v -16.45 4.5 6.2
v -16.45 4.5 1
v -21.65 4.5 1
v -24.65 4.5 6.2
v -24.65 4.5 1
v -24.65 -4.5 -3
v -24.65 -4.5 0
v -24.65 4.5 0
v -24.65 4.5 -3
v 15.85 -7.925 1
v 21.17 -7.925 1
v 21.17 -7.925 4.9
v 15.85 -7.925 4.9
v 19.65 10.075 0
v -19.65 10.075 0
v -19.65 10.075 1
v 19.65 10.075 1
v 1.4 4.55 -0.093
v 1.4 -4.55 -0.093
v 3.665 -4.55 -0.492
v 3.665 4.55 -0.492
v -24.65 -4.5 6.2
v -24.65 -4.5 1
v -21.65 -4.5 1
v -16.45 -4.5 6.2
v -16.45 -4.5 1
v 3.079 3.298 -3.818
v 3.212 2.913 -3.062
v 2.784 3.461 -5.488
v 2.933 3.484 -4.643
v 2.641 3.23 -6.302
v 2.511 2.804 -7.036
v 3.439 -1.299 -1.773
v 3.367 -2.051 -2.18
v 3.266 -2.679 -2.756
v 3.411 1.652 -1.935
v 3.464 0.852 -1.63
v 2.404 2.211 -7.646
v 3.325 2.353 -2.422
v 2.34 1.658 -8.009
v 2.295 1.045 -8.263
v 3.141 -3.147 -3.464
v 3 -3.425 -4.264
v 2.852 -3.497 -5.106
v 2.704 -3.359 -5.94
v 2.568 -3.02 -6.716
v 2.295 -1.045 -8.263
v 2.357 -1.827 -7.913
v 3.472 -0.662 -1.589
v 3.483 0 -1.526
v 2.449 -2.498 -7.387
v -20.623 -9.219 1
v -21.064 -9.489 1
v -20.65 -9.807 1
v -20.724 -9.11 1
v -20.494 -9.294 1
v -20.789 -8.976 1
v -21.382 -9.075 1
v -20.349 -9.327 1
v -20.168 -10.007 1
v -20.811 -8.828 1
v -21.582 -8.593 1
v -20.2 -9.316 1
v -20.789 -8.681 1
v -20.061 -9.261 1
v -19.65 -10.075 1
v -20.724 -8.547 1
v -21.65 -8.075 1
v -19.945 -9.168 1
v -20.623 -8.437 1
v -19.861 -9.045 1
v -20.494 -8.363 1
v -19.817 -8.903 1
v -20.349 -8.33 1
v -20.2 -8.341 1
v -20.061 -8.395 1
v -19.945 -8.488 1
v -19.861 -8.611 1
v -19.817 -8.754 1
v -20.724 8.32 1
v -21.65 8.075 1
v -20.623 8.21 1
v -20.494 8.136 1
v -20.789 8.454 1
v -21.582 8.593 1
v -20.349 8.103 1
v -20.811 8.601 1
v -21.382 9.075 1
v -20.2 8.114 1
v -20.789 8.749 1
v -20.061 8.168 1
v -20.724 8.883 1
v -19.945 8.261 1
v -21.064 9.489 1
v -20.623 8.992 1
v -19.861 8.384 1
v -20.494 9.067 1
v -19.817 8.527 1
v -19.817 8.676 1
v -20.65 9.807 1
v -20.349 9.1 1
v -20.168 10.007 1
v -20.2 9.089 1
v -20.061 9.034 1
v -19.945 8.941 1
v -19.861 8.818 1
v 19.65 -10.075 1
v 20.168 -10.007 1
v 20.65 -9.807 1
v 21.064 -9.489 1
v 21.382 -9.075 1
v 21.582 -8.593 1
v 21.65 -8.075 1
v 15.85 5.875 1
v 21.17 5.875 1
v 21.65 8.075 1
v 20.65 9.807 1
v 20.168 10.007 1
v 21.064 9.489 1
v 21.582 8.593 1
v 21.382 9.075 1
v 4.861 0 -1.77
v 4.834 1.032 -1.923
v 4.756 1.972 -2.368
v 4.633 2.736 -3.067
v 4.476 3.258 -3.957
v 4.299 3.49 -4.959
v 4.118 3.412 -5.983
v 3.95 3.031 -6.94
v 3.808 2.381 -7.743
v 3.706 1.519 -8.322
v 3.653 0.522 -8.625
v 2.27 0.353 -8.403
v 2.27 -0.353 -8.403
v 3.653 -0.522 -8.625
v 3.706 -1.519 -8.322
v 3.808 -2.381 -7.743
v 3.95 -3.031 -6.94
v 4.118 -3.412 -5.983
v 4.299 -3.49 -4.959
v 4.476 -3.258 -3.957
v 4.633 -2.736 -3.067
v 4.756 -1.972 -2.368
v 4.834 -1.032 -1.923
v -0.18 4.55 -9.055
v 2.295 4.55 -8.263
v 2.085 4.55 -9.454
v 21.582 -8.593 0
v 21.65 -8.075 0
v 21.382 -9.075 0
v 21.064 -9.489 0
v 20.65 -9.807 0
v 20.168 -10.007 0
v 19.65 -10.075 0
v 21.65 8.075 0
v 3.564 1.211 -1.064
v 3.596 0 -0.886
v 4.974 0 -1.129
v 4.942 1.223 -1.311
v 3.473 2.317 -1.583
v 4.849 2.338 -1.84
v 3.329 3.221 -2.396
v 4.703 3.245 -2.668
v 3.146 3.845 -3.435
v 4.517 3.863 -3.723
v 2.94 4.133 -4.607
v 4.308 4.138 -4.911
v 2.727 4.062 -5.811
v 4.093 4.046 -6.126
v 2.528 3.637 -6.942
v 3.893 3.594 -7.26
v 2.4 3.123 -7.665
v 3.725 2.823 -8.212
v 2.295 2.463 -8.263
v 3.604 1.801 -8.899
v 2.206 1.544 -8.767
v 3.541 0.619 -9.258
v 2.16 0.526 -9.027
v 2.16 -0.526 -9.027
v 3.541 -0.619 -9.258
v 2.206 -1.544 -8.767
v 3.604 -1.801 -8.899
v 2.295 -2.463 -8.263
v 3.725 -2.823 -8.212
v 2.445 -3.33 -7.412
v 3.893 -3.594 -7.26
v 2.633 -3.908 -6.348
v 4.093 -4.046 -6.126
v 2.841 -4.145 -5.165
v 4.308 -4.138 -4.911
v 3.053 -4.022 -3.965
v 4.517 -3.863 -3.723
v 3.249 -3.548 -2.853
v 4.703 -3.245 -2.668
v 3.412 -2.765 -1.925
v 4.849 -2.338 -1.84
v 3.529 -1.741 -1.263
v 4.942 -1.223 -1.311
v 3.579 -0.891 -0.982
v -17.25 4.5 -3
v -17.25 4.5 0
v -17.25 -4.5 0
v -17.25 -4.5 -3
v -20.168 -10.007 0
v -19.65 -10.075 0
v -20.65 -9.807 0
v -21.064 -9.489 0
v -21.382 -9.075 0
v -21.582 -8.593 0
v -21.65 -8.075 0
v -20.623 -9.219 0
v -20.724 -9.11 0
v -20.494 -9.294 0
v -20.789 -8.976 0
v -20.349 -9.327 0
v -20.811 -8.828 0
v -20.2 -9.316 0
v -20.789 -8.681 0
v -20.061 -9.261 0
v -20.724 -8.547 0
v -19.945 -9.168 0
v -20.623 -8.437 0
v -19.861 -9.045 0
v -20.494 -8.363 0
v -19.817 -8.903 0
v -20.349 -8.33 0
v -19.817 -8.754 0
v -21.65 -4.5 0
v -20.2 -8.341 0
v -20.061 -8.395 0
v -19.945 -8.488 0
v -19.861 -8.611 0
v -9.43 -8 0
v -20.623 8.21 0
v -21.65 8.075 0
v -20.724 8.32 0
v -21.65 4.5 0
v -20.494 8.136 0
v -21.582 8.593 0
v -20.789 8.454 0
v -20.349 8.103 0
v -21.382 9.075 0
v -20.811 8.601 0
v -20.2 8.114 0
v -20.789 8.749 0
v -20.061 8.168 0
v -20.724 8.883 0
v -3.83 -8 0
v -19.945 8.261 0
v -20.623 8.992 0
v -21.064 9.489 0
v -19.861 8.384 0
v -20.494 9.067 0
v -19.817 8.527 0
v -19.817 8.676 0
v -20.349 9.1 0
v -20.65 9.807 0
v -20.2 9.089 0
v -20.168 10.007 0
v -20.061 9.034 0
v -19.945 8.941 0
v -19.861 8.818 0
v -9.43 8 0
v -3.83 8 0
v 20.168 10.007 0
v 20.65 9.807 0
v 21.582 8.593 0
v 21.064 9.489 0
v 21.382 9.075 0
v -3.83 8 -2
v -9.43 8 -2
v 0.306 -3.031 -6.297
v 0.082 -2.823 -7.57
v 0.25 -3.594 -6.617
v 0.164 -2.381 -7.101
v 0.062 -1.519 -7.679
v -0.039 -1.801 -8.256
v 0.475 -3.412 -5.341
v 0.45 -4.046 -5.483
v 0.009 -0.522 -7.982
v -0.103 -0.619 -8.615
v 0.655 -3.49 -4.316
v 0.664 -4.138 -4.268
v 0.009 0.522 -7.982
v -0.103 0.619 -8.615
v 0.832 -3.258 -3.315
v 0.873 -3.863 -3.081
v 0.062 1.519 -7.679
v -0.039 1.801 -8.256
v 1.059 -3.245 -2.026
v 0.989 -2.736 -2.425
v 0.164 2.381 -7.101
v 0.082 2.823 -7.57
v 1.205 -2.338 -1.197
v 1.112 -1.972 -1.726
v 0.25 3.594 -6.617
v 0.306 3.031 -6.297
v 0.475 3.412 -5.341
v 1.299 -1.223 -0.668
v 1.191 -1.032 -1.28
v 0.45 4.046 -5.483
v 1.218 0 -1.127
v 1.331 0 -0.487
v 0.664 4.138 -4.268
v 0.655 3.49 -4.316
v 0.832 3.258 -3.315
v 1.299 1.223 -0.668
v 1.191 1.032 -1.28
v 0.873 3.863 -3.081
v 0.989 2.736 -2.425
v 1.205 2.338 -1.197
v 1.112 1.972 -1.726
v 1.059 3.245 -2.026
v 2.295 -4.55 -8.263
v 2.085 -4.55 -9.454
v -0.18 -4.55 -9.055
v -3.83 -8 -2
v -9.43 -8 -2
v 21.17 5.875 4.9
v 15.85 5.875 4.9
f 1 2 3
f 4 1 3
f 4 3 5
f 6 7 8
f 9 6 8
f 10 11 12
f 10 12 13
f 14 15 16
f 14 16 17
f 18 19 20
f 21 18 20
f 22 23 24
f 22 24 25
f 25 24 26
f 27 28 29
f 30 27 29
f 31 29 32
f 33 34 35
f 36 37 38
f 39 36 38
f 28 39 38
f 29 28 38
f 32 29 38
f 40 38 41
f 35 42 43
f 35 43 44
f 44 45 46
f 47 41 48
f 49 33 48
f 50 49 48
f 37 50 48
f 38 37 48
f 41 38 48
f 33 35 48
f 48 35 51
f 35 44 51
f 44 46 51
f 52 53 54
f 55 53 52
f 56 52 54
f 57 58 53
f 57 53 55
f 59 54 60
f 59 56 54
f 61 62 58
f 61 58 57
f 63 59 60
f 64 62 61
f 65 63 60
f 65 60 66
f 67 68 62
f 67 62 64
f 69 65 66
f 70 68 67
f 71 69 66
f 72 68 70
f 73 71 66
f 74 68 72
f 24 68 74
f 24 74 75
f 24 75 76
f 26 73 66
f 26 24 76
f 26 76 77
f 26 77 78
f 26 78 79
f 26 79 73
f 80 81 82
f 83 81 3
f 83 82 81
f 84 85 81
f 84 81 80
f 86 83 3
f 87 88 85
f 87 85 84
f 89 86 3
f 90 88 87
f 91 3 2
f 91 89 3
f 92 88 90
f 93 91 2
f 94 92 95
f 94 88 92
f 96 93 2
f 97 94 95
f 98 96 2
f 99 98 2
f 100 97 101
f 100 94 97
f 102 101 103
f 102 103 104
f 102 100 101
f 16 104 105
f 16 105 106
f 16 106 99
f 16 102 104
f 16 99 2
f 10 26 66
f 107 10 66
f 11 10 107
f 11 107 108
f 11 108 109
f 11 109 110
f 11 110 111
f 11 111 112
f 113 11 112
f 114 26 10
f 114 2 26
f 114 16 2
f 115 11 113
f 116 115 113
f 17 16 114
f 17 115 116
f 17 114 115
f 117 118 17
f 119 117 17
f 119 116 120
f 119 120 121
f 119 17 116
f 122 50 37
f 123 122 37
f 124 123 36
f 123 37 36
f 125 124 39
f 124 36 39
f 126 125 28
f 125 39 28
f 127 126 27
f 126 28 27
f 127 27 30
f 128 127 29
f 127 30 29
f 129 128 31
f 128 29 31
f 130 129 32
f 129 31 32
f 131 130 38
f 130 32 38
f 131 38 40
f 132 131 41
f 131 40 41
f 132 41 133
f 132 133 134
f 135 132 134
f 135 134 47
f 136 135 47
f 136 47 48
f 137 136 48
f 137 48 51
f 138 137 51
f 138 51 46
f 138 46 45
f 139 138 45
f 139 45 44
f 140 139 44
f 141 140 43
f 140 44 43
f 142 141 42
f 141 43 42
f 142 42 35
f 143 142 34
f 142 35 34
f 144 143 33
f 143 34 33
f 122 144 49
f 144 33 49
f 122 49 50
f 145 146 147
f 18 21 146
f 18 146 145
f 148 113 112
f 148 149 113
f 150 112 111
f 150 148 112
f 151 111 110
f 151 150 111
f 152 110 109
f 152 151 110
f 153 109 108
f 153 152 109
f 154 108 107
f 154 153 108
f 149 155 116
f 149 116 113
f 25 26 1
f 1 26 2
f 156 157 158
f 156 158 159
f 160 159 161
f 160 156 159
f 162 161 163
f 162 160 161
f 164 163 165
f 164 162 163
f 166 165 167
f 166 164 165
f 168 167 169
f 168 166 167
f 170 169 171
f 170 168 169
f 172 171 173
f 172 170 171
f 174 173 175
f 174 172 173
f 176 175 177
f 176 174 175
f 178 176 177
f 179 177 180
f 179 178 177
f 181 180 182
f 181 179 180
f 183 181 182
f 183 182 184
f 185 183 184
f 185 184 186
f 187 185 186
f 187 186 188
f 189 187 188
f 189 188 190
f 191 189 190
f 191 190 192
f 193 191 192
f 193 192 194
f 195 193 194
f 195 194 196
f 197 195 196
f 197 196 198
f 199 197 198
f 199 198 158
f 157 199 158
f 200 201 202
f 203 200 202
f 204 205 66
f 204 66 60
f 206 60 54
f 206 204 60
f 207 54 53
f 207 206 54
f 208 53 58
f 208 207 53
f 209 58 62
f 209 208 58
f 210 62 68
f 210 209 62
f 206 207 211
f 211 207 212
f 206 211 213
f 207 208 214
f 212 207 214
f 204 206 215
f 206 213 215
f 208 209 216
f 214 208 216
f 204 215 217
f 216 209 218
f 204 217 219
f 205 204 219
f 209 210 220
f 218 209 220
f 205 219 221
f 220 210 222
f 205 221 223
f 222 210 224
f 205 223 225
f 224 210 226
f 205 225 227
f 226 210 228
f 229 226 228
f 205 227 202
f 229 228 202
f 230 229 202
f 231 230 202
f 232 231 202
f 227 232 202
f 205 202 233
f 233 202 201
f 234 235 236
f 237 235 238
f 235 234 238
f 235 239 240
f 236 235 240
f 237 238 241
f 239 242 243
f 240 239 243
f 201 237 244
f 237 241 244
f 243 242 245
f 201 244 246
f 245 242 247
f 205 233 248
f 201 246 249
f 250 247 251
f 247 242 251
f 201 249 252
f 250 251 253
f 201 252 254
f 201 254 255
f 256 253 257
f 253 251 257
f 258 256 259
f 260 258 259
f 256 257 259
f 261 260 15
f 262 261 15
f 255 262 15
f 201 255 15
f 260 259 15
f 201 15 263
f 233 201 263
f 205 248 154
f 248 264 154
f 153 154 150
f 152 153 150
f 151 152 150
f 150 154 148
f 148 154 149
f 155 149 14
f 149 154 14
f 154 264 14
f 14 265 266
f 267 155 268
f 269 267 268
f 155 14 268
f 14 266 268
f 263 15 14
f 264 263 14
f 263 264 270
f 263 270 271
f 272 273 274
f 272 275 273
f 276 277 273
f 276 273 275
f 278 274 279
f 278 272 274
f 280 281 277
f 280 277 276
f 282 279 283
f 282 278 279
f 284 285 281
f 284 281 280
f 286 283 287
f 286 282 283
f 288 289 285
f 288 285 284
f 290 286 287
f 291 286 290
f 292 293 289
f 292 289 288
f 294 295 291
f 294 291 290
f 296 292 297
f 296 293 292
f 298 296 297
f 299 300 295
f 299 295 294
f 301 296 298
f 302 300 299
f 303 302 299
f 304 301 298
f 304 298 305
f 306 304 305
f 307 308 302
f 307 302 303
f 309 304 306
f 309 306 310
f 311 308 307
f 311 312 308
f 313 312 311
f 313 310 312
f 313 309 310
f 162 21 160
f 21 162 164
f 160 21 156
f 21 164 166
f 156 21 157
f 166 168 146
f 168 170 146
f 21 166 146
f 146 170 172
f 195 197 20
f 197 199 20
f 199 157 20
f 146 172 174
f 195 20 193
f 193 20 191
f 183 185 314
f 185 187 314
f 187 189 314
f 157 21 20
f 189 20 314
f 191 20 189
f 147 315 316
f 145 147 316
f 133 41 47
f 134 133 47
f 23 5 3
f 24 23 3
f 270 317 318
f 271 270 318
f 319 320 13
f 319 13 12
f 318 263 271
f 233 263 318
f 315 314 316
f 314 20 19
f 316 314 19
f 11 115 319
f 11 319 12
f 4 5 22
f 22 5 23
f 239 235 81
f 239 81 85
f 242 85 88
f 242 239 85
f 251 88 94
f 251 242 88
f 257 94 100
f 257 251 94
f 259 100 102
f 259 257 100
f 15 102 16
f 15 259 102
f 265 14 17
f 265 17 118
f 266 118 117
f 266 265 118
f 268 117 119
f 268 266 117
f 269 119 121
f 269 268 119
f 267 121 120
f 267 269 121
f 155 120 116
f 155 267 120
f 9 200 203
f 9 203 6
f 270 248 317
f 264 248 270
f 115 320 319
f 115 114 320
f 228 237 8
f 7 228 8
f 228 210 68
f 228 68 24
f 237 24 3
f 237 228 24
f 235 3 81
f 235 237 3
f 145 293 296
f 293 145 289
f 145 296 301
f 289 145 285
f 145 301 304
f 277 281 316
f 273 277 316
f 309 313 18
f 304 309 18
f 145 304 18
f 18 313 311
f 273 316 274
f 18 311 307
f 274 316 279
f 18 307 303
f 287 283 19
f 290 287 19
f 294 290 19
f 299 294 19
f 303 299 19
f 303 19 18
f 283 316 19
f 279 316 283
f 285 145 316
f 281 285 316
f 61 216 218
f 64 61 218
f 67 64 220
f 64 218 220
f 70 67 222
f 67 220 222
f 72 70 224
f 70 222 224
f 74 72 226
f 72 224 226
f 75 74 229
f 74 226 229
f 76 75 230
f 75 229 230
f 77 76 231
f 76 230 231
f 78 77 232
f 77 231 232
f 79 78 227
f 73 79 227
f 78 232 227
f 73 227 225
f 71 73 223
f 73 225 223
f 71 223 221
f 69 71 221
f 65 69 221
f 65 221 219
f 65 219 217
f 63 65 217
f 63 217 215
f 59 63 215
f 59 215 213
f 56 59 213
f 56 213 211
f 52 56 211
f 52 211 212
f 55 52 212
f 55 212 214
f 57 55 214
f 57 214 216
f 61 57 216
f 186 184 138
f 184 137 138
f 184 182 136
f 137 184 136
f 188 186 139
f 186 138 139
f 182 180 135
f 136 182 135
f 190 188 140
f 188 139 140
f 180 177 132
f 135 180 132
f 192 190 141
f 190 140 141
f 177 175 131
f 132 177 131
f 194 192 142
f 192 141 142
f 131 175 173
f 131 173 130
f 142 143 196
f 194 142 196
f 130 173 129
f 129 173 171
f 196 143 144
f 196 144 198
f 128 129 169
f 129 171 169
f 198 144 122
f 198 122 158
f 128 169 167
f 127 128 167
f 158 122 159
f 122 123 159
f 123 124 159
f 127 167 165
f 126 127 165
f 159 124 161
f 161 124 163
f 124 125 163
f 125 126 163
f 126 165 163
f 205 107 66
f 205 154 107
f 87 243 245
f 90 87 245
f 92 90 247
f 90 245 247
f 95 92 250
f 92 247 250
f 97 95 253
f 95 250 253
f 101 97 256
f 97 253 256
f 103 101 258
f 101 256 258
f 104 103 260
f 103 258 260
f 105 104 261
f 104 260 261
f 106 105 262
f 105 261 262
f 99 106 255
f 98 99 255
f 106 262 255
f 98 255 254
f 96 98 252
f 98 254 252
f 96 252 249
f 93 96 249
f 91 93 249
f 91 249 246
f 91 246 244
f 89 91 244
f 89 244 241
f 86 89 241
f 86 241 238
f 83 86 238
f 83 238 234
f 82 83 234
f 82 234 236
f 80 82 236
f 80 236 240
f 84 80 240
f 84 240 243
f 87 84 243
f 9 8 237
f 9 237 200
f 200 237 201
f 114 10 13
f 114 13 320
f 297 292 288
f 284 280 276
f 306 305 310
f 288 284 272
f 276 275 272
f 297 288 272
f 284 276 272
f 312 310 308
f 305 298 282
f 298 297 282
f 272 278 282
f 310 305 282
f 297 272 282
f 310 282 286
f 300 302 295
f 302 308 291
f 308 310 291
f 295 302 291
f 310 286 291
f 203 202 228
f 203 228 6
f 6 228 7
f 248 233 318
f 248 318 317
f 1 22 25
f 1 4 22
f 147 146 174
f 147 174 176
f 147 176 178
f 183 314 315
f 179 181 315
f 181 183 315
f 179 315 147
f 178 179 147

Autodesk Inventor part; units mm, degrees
ref_plane "YZ Plane" through (0, 0, 0) normal (1, 0, 0) x (0, 1, 0)
ref_plane "XZ Plane" through (0, 0, 0) normal (0, 1, 0) x (-1, 0, 0)
ref_plane "XY Plane" through (0, 0, 0) normal (0, 0, 1) x (1, 0, 0)
sketch "Sketch1" plane through (0, 0, 0) normal (0, 0, 1) x (1, 0, 0)
  line L0 (19.65, -10.075) -> (-19.65, -10.075)
  line L1 (-21.65, -8.075) -> (-21.65, 8.075)
  line L2 (-19.65, 10.075) -> (19.65, 10.075)
  line L3 (21.65, 8.075) -> (21.65, -8.075)
  line L4 (21.65, -10.075) -> (-21.65, 10.075) construction
  line L5 (-21.65, -10.075) -> (21.65, 10.075) construction
  arc A0 (-19.65, 10.075) -> (-21.65, 8.075) centre (-19.65, 8.075) ccw
  arc A1 (21.65, 8.075) -> (19.65, 10.075) centre (19.65, 8.075) ccw
  arc A2 (19.65, -10.075) -> (21.65, -8.075) centre (19.65, -8.075) ccw
  arc A3 (-21.65, -8.075) -> (-19.65, -10.075) centre (-19.65, -8.075) ccw
  point P0 (0, 0)
  dimension "d0" = 43.3
  dimension "d1" = 20.15
  dimension "d2" = 2
extrude "Extrusion1" add sketch "Sketch1" along normal blind 1
sketch "Sketch2" plane through (0, 0, 0) normal (0, 0, -1) x (-1, 0, 0)
  line L0 (19.65, 10.075) -> (-19.65, 10.075) projected
  arc A0 (-19.65, 10.075) -> (-21.65, 8.075) centre (-19.65, 8.075) ccw projected
  line L1 (-21.65, 8.075) -> (-21.65, -8.075) projected
  arc A1 (-21.65, -8.075) -> (-19.65, -10.075) centre (-19.65, -8.075) ccw projected
  line L2 (-19.65, -10.075) -> (19.65, -10.075) projected
  arc A2 (19.65, -10.075) -> (21.65, -8.075) centre (19.65, -8.075) ccw projected
  line L3 (21.65, -8.075) -> (21.65, 8.075) projected
  arc A3 (21.65, 8.075) -> (19.65, 10.075) centre (19.65, 8.075) ccw projected
  line L4 (17.25, -4.5) -> (24.65, -4.5)
  line L5 (24.65, -4.5) -> (24.65, 4.5)
  line L6 (24.65, 4.5) -> (17.25, 4.5)
  line L7 (17.25, 4.5) -> (17.25, -4.5)
  line L8 (17.25, -4.5) -> (24.65, 4.5) construction
  line L9 (24.65, -4.5) -> (17.25, 4.5) construction
  point P0 (0, 0)
  point P1 (20.95, 0)
  dimension "d5" = 7.4
  dimension "d6" = 9
  dimension "d7" = 3
extrude "Extrusion2" add sketch "Sketch2" along normal blind 3 contours L6 L5 L4 L3 | L3 L4 L7 L6
sketch "Sketch3" plane through (0, 0, 1) normal (0, 0, 1) x (1, 0, 0)
  line L0 (-16.45, 4.5) -> (-24.65, 4.5)
  line L1 (-24.65, 4.5) -> (-24.65, -4.5)
  line L2 (-24.65, -4.5) -> (-16.45, -4.5)
  line L3 (-16.45, -4.5) -> (-16.45, 4.5)
  line L4 (-16.45, 4.5) -> (-24.65, -4.5) construction
  line L5 (-24.65, 4.5) -> (-16.45, -4.5) construction
  line L6 (-21.65, 8.075) -> (-21.65, -8.075) projected
  point P0 (0, 0)
  point P1 (-20.55, 0)
  dimension "d10" = 8.2
  dimension "d11" = 9
  dimension "d12" = 3
extrude "Extrusion3" add sketch "Sketch3" along normal blind 5.2
sketch "Sketch4" plane through (0, 0, 1) normal (0, 0, 1) x (1, 0, 0)
  line L0 (21.1704, -7.925) -> (15.85, -7.925)
  line L1 (15.85, -7.925) -> (15.85, 5.875)
  line L2 (15.85, 5.875) -> (21.1704, 5.875)
  line L3 (21.1704, 5.875) -> (21.1704, -7.925)
  line L4 (-19.65, -10.075) -> (19.65, -10.075) projected
  line L5 (19.65, 10.075) -> (-19.65, 10.075) projected
  line L6 (21.65, -8.075) -> (21.65, 8.075) projected
  point P0 (0, 0)
  dimension "d15" = 2.15
  dimension "d16" = 4.2
  dimension "d17" = 5.8
extrude "Extrusion4" add sketch "Sketch4" along normal blind 3.9
sketch "Sketch5" plane through (0, 0, 0) normal (0, 0, -1) x (-1, 0, 0)
  line L0 (17.25, 4.5) -> (21.65, 4.5) projected
  line L1 (21.65, 4.5) -> (21.65, 8.075) projected
  arc A0 (21.65, 8.075) -> (19.65, 10.075) centre (19.65, 8.075) ccw projected
  line L2 (19.65, 10.075) -> (-19.65, 10.075) projected
  arc A1 (-19.65, 10.075) -> (-21.65, 8.075) centre (-19.65, 8.075) ccw projected
  line L3 (-21.65, 8.075) -> (-21.65, -8.075) projected
  arc A2 (-21.65, -8.075) -> (-19.65, -10.075) centre (-19.65, -8.075) ccw projected
  line L4 (-19.65, -10.075) -> (19.65, -10.075) projected
  arc A3 (19.65, -10.075) -> (21.65, -8.075) centre (19.65, -8.075) ccw projected
  line L5 (21.65, -8.075) -> (21.65, -4.5) projected
  line L6 (21.65, -4.5) -> (17.25, -4.5) projected
  line L7 (17.25, -4.5) -> (17.25, 4.5) projected
  circle A4 centre (20.3112, 8.6013) radius 0.5
  circle A5 centre (20.3112, -8.8284) radius 0.5
  point P0 (0, 0)
  dimension "d20" = 1
  dimension "d21" = 1
extrude "Extrusion5" cut sketch "Sketch5" against normal blind 3.9 contours A4 | A5
sketch "Sketch6" plane through (0, 0, 0) normal (0, 1, 0) x (-1, 0, 0)
  line L0 (19.65, 0) -> (-19.65, 0) projected
  line L1 (-3.7519, 0) -> (-2.2949, -8.2628)
  line L2 (21.65, 0) -> (21.65, 1) projected
  line L3 (-3.6651, -0.4924) -> (-2.0849, -9.4542)
  line L4 (-2.0849, -9.4542) -> (0.1802, -9.0548)
  line L5 (0.1802, -9.0548) -> (-1.4, -0.093)
  line L6 (-1.4, -0.093) -> (-3.6651, -0.4924)
  line L7 (-3.6651, -0.4924) -> (0.1802, -9.0548) construction
  line L8 (-2.0849, -9.4542) -> (-1.4, -0.093) construction
  line L9 (-21.65, 0) -> (-21.65, 1) projected
  point P0 (0, 0)
  point P1 (-1.7424, -4.7736)
  dimension "deg_1" = 80
  dimension "d28" = 9.1
  dimension "d29" = 2.3
  dimension "d30" = 0.5
  dimension "d42" = 20.25
extrude "Extrusion6" add sketch "Sketch6" along normal mid plane 9.1
sketch "Sketch7" plane through (1.4, -4.55, -0.093) normal (-0.9848, 0, 0.1736) x (0.1736, 0, 0.9848)
  line L0 (0, 9.1) -> (0, 0) projected
  line L1 (-9.1, 9.1) -> (0, 9.1) projected
  line L2 (-9.1, 9.1) -> (-9.1, 0) projected
  line L3 (0, 0) -> (-9.1, 0) projected
  circle A0 centre (-4.55, 4.55) radius 4.15
  circle A1 centre (-4.55, 4.55) radius 3.5
  point P0 (-0.1515, 4.55)
  dimension "d33" = 8.3
  dimension "d34" = 7
extrude "Extrusion7" add sketch "Sketch7" against normal blind 3.7 contours A0
sketch "Sketch8" plane through (0, 0, 0) normal (0, 0, -1) x (-1, 0, 0)
  line L0 (9.43, -8) -> (3.83, -8)
  line L1 (3.83, -8) -> (3.83, 8)
  line L2 (3.83, 8) -> (9.43, 8)
  line L3 (9.43, 8) -> (9.43, -8)
  line L4 (9.43, -8) -> (3.83, 8) construction
  line L5 (3.83, -8) -> (9.43, 8) construction
  line L6 (21.65, 4.5) -> (21.65, 8.075) projected
  point P0 (0, 0)
  point P1 (6.63, 0)
  dimension "d37" = 5.6
  dimension "d38" = 16
  dimension "d39" = 12.22
extrude "Extrusion8" add sketch "Sketch8" along normal blind 2
properties part number "00_ESP32_CAM"
